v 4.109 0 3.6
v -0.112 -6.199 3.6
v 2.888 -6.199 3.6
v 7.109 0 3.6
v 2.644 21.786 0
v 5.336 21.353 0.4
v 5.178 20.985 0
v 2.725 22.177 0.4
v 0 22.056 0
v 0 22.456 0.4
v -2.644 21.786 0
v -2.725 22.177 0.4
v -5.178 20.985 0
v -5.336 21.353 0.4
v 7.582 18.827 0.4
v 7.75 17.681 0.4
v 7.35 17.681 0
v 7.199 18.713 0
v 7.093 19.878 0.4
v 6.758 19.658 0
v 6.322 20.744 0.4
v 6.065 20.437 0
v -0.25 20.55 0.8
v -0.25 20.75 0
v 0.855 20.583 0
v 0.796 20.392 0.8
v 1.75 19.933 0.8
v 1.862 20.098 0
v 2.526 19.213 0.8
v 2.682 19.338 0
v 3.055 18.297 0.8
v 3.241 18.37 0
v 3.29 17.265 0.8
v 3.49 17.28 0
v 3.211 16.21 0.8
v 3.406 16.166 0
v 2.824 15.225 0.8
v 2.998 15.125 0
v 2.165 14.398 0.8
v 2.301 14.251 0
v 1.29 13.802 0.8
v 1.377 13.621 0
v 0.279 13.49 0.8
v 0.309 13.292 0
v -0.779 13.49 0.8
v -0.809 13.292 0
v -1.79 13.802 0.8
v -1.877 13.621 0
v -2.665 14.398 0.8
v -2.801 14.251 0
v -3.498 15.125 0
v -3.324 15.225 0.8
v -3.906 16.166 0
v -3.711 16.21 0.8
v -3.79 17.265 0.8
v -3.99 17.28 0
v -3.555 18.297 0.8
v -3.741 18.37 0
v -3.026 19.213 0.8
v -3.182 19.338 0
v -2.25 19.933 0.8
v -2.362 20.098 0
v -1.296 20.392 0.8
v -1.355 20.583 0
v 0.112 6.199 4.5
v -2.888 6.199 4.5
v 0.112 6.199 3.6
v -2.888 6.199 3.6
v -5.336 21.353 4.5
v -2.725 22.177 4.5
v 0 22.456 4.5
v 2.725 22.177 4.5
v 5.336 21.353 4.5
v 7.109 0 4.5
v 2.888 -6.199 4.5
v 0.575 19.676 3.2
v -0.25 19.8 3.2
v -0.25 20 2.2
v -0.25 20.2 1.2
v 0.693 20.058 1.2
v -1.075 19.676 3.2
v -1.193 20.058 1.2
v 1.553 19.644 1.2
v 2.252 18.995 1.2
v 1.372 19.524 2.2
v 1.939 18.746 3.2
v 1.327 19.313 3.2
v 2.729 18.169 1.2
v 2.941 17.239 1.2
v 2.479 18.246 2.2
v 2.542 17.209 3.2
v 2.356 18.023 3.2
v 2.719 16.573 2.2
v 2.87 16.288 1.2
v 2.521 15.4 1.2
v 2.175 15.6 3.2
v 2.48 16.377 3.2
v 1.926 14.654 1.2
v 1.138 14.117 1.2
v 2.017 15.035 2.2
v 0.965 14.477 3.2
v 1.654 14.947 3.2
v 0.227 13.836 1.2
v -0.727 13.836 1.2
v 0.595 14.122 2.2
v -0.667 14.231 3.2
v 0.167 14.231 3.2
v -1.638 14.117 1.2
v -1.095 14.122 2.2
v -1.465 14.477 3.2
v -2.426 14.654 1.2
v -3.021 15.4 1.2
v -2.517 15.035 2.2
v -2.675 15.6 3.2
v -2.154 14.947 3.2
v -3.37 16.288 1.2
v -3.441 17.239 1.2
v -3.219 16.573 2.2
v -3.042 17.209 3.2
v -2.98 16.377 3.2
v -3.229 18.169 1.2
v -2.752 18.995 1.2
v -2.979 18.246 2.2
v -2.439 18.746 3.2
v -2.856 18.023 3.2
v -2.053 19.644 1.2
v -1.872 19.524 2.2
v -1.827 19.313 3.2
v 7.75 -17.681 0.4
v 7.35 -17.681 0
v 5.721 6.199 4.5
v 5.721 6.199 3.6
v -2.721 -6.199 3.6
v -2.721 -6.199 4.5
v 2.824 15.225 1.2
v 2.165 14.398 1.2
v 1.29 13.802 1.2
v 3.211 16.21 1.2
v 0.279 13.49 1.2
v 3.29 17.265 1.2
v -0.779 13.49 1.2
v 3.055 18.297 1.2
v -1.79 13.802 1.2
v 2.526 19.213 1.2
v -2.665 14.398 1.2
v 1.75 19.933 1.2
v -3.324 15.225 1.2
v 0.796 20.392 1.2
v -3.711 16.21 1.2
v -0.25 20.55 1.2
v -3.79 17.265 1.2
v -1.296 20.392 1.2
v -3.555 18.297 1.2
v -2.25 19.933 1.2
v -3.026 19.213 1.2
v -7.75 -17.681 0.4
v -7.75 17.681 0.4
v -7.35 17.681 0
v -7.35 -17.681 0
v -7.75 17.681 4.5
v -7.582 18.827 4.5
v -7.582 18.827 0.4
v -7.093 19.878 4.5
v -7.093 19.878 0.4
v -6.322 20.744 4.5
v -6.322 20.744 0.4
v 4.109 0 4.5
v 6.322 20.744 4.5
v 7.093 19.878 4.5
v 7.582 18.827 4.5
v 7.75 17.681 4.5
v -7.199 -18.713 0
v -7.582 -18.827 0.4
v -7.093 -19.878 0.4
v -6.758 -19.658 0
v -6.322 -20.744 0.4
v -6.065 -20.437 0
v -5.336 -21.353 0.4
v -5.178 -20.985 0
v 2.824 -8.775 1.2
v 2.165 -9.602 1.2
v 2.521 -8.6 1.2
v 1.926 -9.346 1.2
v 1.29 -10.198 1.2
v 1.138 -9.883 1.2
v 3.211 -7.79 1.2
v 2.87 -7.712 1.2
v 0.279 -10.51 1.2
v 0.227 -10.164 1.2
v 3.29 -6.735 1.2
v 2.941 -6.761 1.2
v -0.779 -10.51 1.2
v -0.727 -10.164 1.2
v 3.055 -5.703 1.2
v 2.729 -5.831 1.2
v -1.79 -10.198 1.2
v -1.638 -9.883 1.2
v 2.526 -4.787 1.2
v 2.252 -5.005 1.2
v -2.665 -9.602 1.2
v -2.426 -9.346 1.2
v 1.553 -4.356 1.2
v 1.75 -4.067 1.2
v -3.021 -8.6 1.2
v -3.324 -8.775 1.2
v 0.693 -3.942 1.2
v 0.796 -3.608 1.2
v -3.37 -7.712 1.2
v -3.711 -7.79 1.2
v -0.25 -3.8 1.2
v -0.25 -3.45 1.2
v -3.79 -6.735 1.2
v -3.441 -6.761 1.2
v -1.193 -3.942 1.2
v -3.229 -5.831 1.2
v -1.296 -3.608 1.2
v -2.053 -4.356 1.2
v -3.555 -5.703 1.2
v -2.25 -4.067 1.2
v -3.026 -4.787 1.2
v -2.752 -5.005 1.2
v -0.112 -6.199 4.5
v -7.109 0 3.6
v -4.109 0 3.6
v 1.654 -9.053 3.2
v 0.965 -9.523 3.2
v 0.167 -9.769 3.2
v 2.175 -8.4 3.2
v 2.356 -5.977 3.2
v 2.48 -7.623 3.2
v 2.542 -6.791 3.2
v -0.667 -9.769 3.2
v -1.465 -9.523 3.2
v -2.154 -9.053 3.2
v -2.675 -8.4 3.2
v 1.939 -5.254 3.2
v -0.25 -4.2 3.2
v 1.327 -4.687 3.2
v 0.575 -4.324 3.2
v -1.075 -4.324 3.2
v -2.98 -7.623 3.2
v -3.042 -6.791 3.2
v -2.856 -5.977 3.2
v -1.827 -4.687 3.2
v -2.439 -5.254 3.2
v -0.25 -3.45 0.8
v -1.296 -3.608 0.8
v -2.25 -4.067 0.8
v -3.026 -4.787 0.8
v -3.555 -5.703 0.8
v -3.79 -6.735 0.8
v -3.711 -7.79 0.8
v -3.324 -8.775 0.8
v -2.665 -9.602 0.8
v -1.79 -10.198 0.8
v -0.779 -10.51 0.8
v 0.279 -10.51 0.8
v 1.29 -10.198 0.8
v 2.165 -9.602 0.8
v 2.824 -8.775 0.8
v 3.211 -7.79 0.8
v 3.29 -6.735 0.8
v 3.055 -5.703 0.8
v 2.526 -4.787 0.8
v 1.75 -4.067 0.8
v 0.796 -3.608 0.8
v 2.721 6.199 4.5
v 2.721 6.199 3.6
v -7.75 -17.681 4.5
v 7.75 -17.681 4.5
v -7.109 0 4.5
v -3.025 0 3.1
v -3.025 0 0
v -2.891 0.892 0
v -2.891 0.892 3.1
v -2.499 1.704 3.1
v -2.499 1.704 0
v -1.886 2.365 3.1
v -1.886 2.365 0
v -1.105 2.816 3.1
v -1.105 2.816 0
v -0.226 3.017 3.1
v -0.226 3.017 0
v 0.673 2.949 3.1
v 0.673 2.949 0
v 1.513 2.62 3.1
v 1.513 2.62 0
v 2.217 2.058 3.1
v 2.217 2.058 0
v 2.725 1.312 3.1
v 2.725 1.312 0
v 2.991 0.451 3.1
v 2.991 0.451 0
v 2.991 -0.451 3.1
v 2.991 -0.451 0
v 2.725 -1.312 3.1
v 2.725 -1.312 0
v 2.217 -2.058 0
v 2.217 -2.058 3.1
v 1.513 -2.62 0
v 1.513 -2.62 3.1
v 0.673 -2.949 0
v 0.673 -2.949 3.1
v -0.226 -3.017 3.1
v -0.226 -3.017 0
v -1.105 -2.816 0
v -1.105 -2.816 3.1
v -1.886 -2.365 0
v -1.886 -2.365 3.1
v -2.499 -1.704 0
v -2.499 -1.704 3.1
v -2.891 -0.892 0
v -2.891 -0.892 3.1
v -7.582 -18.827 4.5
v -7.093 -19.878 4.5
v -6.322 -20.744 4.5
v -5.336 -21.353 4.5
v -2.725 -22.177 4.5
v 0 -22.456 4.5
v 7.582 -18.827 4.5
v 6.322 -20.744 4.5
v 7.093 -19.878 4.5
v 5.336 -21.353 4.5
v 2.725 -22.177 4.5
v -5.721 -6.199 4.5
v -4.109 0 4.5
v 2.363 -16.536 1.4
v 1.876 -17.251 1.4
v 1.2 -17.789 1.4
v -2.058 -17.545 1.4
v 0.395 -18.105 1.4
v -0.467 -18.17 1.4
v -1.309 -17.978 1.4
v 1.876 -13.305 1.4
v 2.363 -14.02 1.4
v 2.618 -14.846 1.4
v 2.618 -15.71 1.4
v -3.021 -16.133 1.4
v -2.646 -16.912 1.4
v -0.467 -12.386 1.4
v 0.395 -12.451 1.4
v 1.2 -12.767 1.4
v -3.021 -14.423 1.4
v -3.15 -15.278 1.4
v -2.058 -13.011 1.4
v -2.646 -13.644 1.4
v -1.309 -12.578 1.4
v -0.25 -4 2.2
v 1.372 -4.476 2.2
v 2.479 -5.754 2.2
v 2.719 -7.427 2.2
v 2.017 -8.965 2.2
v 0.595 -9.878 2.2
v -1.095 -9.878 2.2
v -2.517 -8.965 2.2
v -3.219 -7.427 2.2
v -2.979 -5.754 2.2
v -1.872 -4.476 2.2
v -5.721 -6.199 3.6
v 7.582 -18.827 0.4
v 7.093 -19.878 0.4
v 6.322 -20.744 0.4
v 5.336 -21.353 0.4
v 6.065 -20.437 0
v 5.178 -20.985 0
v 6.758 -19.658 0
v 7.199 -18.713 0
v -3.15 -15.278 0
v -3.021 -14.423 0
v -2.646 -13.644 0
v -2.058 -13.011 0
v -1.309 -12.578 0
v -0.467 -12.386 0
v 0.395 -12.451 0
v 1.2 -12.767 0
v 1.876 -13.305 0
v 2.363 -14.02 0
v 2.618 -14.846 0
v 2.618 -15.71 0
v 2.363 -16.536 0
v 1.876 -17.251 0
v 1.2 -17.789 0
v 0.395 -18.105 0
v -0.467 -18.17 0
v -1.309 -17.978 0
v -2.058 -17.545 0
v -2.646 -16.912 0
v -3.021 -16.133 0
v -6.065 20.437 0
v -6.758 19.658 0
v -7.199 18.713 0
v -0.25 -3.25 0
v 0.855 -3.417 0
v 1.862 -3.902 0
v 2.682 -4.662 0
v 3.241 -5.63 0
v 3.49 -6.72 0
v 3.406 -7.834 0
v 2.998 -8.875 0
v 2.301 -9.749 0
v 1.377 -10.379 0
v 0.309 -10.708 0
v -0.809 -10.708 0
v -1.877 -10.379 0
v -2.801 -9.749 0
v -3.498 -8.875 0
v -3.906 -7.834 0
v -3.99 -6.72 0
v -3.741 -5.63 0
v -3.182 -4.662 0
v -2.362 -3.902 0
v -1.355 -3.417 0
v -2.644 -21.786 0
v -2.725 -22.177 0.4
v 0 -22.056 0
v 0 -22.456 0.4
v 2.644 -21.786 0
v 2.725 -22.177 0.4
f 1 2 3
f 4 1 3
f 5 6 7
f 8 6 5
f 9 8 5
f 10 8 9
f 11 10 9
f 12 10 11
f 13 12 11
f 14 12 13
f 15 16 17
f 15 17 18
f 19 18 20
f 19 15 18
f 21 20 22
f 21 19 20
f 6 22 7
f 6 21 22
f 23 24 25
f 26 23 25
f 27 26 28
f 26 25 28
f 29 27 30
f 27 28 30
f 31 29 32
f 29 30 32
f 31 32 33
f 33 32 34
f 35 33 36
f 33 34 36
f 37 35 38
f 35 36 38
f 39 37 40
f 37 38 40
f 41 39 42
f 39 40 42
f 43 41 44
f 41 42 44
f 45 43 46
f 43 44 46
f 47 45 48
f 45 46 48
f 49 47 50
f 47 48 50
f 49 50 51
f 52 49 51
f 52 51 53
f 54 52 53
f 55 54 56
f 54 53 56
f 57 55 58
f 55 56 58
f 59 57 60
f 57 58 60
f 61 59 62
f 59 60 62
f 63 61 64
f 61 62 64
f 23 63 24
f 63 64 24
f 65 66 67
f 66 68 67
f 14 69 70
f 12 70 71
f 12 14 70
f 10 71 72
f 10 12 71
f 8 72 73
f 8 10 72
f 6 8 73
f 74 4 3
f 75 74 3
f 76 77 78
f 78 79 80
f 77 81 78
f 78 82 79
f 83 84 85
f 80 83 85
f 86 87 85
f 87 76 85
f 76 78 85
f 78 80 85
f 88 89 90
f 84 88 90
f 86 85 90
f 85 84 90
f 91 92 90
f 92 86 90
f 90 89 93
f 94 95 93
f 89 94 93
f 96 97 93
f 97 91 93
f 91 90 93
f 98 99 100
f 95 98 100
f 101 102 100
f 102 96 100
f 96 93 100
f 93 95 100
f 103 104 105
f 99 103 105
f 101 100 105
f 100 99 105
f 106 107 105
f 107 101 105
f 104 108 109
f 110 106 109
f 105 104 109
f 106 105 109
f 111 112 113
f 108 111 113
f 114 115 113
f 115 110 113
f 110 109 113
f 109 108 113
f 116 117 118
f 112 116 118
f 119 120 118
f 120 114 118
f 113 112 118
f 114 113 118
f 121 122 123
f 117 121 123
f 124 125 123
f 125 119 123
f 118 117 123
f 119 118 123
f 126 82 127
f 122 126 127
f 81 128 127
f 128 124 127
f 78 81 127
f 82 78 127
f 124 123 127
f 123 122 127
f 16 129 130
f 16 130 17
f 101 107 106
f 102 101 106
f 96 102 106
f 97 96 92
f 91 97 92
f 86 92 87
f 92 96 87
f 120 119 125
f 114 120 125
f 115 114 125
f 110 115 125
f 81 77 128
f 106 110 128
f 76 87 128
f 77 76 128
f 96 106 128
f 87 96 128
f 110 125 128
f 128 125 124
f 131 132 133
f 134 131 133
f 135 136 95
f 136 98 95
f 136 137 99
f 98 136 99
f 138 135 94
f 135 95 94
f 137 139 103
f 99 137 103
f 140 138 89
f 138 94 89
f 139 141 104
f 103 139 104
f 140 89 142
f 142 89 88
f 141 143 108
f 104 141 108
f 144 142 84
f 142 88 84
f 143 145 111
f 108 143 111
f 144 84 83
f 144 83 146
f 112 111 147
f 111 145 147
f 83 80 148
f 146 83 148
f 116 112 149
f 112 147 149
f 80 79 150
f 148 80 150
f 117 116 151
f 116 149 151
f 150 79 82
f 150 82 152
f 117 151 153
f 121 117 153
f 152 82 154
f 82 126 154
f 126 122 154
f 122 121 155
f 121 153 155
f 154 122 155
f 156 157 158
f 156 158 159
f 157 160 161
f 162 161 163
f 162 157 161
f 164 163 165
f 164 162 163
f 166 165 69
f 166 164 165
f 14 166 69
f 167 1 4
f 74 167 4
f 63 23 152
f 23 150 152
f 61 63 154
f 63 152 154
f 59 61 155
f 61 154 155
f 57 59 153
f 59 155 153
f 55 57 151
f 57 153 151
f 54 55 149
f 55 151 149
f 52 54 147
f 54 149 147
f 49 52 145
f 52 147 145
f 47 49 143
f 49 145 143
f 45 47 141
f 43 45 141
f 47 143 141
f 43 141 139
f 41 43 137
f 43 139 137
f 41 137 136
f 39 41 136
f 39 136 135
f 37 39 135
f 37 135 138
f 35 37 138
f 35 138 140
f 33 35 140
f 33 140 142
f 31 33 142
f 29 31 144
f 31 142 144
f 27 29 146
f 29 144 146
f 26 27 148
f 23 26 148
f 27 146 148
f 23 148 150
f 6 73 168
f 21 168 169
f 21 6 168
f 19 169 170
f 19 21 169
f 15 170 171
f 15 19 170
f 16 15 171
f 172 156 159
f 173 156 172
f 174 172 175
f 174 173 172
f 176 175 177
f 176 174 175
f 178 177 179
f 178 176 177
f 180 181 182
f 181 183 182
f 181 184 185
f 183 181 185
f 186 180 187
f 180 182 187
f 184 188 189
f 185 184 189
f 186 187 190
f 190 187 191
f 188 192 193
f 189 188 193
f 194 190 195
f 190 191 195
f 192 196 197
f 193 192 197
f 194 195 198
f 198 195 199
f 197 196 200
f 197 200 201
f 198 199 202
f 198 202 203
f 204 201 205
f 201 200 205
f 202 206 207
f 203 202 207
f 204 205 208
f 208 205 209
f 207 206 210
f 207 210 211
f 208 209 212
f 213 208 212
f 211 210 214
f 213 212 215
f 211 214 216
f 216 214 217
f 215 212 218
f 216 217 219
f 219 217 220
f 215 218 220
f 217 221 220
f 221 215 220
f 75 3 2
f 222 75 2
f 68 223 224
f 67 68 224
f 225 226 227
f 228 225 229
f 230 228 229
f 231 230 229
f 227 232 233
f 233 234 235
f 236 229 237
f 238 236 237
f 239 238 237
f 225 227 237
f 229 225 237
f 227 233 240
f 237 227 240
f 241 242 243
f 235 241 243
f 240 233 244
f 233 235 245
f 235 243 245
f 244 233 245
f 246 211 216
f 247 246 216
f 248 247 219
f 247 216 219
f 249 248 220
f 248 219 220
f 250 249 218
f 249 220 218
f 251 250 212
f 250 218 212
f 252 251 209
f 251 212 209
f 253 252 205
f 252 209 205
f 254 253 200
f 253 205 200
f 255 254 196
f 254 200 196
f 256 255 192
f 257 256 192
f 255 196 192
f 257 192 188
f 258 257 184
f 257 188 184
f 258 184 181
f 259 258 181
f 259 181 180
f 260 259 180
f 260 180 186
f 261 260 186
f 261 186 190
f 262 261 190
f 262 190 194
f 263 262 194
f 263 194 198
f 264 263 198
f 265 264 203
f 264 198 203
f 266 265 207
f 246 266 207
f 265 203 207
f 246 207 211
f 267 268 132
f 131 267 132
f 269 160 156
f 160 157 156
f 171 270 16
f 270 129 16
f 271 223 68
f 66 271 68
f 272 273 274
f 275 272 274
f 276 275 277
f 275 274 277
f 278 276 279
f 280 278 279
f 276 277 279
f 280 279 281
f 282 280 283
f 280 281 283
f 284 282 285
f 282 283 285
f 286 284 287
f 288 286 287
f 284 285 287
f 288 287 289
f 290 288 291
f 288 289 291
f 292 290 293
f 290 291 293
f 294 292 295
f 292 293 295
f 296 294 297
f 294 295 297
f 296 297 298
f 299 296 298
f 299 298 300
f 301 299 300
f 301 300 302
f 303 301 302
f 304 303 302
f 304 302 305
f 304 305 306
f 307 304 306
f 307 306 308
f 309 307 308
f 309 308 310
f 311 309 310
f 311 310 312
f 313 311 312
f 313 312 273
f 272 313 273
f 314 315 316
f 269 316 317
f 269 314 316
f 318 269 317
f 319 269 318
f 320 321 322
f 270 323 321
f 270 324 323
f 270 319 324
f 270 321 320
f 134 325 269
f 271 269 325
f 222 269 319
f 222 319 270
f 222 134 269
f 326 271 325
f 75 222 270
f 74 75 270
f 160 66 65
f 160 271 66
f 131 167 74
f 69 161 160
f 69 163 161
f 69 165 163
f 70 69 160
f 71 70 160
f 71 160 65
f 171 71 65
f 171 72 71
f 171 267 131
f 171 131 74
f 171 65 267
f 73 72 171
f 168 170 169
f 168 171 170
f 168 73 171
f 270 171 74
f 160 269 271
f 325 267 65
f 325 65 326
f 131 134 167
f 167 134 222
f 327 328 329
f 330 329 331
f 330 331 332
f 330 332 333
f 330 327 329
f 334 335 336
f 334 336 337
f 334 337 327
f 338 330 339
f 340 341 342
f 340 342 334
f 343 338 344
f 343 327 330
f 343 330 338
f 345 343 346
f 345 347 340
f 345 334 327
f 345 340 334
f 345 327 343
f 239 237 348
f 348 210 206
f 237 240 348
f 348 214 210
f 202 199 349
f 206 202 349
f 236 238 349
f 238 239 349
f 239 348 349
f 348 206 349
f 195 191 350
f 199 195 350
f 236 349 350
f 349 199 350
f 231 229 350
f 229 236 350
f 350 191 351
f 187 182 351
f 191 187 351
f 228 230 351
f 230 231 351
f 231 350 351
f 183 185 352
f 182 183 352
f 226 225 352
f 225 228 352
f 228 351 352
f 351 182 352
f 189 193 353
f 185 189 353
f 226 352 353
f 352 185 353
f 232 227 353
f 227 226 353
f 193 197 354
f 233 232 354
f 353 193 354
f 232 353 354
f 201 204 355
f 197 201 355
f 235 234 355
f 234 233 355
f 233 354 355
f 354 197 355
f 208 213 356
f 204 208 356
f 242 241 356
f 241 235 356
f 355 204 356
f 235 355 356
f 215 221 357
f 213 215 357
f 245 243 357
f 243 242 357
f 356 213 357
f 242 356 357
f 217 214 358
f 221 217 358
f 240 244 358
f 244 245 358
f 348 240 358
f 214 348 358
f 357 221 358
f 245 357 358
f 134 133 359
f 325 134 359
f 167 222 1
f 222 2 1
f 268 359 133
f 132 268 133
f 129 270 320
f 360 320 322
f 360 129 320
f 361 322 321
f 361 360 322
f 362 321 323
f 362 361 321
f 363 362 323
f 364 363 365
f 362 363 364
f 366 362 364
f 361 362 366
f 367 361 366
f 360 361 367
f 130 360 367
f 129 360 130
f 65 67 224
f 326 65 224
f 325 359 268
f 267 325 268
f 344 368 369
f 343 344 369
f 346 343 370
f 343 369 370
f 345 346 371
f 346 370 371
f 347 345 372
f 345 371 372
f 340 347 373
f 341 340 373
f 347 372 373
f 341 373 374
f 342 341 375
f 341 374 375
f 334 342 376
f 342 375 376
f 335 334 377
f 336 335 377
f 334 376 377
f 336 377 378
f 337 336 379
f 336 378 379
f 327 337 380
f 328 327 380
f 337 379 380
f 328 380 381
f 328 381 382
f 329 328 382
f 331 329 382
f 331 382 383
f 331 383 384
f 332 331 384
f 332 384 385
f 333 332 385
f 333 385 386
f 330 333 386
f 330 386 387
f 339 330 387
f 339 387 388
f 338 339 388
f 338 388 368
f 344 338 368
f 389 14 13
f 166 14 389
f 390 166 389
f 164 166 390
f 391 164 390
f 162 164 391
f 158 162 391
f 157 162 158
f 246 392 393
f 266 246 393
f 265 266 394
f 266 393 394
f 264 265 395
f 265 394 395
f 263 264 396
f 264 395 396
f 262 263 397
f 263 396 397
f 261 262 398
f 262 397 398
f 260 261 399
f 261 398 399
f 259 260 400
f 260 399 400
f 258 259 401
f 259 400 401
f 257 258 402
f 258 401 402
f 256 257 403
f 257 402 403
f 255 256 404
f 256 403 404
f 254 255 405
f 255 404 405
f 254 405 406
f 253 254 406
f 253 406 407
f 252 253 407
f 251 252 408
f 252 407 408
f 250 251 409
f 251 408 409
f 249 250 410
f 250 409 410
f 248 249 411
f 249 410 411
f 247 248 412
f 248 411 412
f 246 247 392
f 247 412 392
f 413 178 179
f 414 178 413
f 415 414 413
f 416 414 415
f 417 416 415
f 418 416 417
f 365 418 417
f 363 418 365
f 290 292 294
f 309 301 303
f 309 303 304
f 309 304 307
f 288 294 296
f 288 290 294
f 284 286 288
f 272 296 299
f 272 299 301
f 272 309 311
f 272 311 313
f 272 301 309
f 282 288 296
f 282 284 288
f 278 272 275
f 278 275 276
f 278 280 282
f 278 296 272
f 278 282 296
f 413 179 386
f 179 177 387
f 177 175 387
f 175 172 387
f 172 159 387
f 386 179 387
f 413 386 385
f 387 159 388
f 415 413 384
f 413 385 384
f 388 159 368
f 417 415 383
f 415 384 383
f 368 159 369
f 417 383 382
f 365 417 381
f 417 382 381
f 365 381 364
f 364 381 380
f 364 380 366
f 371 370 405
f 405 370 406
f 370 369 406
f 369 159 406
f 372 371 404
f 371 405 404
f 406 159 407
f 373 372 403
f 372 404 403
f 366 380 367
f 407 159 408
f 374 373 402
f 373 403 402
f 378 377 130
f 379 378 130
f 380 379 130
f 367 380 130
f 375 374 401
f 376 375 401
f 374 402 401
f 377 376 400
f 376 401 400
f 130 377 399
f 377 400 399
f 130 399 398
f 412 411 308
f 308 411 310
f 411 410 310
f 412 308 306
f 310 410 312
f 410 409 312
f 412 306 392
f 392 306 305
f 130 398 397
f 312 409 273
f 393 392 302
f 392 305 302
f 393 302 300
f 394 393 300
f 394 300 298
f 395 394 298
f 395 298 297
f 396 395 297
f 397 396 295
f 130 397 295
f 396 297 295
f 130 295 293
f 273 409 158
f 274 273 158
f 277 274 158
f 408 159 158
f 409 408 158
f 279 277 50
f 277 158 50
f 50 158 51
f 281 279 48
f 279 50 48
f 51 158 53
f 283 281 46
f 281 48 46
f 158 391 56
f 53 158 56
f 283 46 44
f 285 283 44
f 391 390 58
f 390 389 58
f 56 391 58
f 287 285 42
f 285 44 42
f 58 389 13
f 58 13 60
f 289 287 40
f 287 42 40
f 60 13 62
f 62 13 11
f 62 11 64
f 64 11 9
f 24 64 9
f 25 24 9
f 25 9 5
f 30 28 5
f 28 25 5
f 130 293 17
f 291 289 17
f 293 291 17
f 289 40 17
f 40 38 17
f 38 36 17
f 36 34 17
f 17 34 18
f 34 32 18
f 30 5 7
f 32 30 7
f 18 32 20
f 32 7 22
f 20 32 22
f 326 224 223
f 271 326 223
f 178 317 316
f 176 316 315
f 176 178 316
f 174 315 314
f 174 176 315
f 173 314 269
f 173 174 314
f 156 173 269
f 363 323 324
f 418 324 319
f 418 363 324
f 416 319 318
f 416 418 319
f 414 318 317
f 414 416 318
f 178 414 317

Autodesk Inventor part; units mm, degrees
ref_plane "YZ Plane" through (0, 0, 0) normal (1, 0, 0) x (0, 1, 0)
ref_plane "XZ Plane" through (0, 0, 0) normal (0, 1, 0) x (-1, 0, 0)
ref_plane "XY Plane" through (0, 0, 0) normal (0, 0, 1) x (1, 0, 0)
sketch "Skizze1" plane through (0, 0, 0) normal (0, 0, 1) x (1, 0, 0)
  line L0 (7.75, -17.6806) -> (7.75, 17.6806) projected
  line L1 (-7.75, 17.6806) -> (-7.75, -17.6806) projected
  circle A0 centre (0, 0) radius 3.025 projected
  arc A1 (-5.3363, -21.3526) -> (5.3363, -21.3526) centre (0, -9) ccw projected
  arc A2 (5.3363, -21.3526) -> (7.75, -17.6806) centre (3.75, -17.6806) ccw projected
  arc A3 (7.75, 17.6806) -> (5.3363, 21.3526) centre (3.75, 17.6806) ccw projected
  arc A4 (5.3363, 21.3526) -> (-5.3363, 21.3526) centre (0, 9) ccw projected
  arc A5 (-5.3363, 21.3526) -> (-7.75, 17.6806) centre (-3.75, 17.6806) ccw projected
  arc A6 (-7.75, -17.6806) -> (-5.3363, -21.3526) centre (-3.75, -17.6806) ccw projected
  circle A7 centre (-0.25, 17) radius 1.7 projected
  circle A8 centre (-0.25, -7) radius 1.7 projected
  line L2 (5.34, 14.1) -> (3.3, 14.1) projected
  line L3 (3.3, 14.1) -> (3.3, 17.74) projected
  line L4 (3.3, 17.74) -> (5.34, 17.74) projected
  line L5 (5.34, 17.74) -> (5.34, 14.1) projected
  line L6 (-3.8, 14.1) -> (-5.84, 14.1) projected
  line L7 (-5.84, 14.1) -> (-5.84, 17.74) projected
  line L8 (-5.84, 17.74) -> (-3.8, 17.74) projected
  line L9 (-3.8, 17.74) -> (-3.8, 14.1) projected
  circle A9 centre (-0.25, -15.278) radius 2.9 projected
  point P0 (0, 0)
  point P1 (-17.1225, -5.975)
  point P2 (-17.1225, -12.025)
  point P3 (-17.1225, 6.3)
  point P4 (-17.1225, -14.3)
  point P5 (-17.1225, -17.7)
extrude "Extrusion1" add sketch "Skizze1" along normal blind 4 contours A2 A1 A6 L1 A5 A4 A3 L0 | A0 | A7 | A8 | L2 L3 L4 L5 | L6 L7 L8 L9 | A9
sketch "Skizze2" plane through (0, 0, 0) normal (0, 0, -1) x (-1, 0, 0)
  circle A0 centre (0, 0) radius 3.025 projected
  arc A1 (-5.3363, -21.3526) -> (5.3363, -21.3526) centre (0, -9) ccw projected
  arc A2 (-7.75, -17.6806) -> (-5.3363, -21.3526) centre (-3.75, -17.6806) ccw projected
  line L0 (-7.75, -17.6806) -> (-7.75, 17.6806) projected
  arc A3 (-5.3363, 21.3526) -> (-7.75, 17.6806) centre (-3.75, 17.6806) ccw projected
  arc A4 (5.3363, 21.3526) -> (-5.3363, 21.3526) centre (0, 9) ccw projected
  arc A5 (7.75, 17.6806) -> (5.3363, 21.3526) centre (3.75, 17.6806) ccw projected
  line L1 (7.75, 17.6806) -> (7.75, -17.6806) projected
  arc A6 (5.3363, -21.3526) -> (7.75, -17.6806) centre (3.75, -17.6806) ccw projected
  circle A7 centre (0.25, 17) radius 1.7 projected
  circle A8 centre (0.25, -7) radius 1.7 projected
  line L2 (-5.34, 14.1) -> (-3.3, 14.1) projected
  line L3 (-3.3, 14.1) -> (-3.3, 17.74) projected
  line L4 (-3.3, 17.74) -> (-5.34, 17.74) projected
  line L5 (-5.34, 17.74) -> (-5.34, 14.1) projected
  line L6 (3.8, 14.1) -> (5.84, 14.1) projected
  line L7 (5.84, 14.1) -> (5.84, 17.74) projected
  line L8 (5.84, 17.74) -> (3.8, 17.74) projected
  line L9 (3.8, 17.74) -> (3.8, 14.1) projected
  circle A9 centre (0.25, -15.278) radius 2.9 projected
  point P0 (0, 0)
extrude "Extrusion2" cut sketch "Skizze2" against normal blind 3.1 contours A0
sketch "Skizze3" plane through (0, 0, 0) normal (0, 0, -1) x (-1, 0, 0)
  circle A0 centre (0, 0) radius 3.025 projected
  arc A1 (-5.3363, -21.3526) -> (5.3363, -21.3526) centre (0, -9) ccw projected
  arc A2 (-7.75, -17.6806) -> (-5.3363, -21.3526) centre (-3.75, -17.6806) ccw projected
  line L0 (-7.75, -17.6806) -> (-7.75, 17.6806) projected
  arc A3 (-5.3363, 21.3526) -> (-7.75, 17.6806) centre (-3.75, 17.6806) ccw projected
  arc A4 (5.3363, 21.3526) -> (-5.3363, 21.3526) centre (0, 9) ccw projected
  arc A5 (7.75, 17.6806) -> (5.3363, 21.3526) centre (3.75, 17.6806) ccw projected
  line L1 (7.75, 17.6806) -> (7.75, -17.6806) projected
  arc A6 (5.3363, -21.3526) -> (7.75, -17.6806) centre (3.75, -17.6806) ccw projected
  circle A7 centre (0.25, 17) radius 1.7 projected
  circle A8 centre (0.25, -7) radius 1.7 projected
  line L2 (-5.34, 14.1) -> (-3.3, 14.1) projected
  line L3 (-3.3, 14.1) -> (-3.3, 17.74) projected
  line L4 (-3.3, 17.74) -> (-5.34, 17.74) projected
  line L5 (-5.34, 17.74) -> (-5.34, 14.1) projected
  line L6 (3.8, 14.1) -> (5.84, 14.1) projected
  line L7 (5.84, 14.1) -> (5.84, 17.74) projected
  line L8 (5.84, 17.74) -> (3.8, 17.74) projected
  line L9 (3.8, 17.74) -> (3.8, 14.1) projected
  circle A9 centre (0.25, -15.278) radius 2.9 projected
  point P0 (0, 0)
hole "Bohrung1" at (-0.25, 17, 0) at (-0.25, -7, 0) direction (0, 0, 1) diameter 5.6 depth 3.2 counterbore diameter 7.1 counterbore depth 1.2
sketch "Skizze4" plane through (0, 0, 4) normal (0, 0, 1) x (1, 0, 0)
  circle A0 centre (-0.25, 17) radius 3.55 projected
  circle A1 centre (-0.25, -7) radius 3.55 projected
  circle A2 centre (0, 0) radius 3.025 projected
  arc A3 (5.3363, -21.3526) -> (7.75, -17.6806) centre (3.75, -17.6806) ccw projected
  arc A4 (-5.3363, -21.3526) -> (5.3363, -21.3526) centre (0, -9) ccw projected
  arc A5 (-7.75, -17.6806) -> (-5.3363, -21.3526) centre (-3.75, -17.6806) ccw projected
  line L0 (-7.75, 17.6806) -> (-7.75, -17.6806) projected
  arc A6 (-5.3363, 21.3526) -> (-7.75, 17.6806) centre (-3.75, 17.6806) ccw projected
  arc A7 (5.3363, 21.3526) -> (-5.3363, 21.3526) centre (0, 9) ccw projected
  arc A8 (7.75, 17.6806) -> (5.3363, 21.3526) centre (3.75, 17.6806) ccw projected
  line L1 (7.75, -17.6806) -> (7.75, 17.6806) projected
  circle A9 centre (12.6079, -10) radius 2.8
  circle A10 centre (12.6079, -10) radius 2.8
  line L2 (4.1087, 0) -> (7.1087, 0)
  line L3 (7.1087, 0) -> (2.8877, -6.1994)
  line L4 (2.8877, -6.1994) -> (-0.1123, -6.1994)
  line L5 (-0.1123, -6.1994) -> (4.1087, 0)
  line L6 (2.721, 6.1994) -> (5.721, 6.1994)
  line L7 (5.721, 6.1994) -> (-2.721, -6.1994)
  line L8 (-2.721, -6.1994) -> (-5.721, -6.1994)
  line L9 (-5.721, -6.1994) -> (2.721, 6.1994)
  line L10 (-2.8877, 6.1994) -> (0.1123, 6.1994)
  line L11 (0.1123, 6.1994) -> (-4.1087, 0)
  line L12 (-4.1087, 0) -> (-7.1087, 0)
  line L13 (-7.1087, 0) -> (-2.8877, 6.1994)
  line L14 (7.1087, 6.1994) -> (7.1087, -6.1994)
  line L15 (7.1087, -6.1994) -> (-7.1087, -6.1994)
  line L16 (-7.1087, -6.1994) -> (-7.1087, 6.1994)
  line L17 (-7.1087, 6.1994) -> (7.1087, 6.1994)
  point P0 (0, 0)
  point P1 (16.5579, -10)
  point P2 (16.5579, -10)
  point P3 (16.5579, -10)
  point P4 (50.5428, -9.282)
  point P5 (-4.221, -6.1994)
  point P6 (4.221, 6.1994)
  point P7 (-1.3877, 6.1994)
  point P8 (1.3877, -6.1994)
  dimension "d89" = 5.6
  dimension "d104" = 5.6
  dimension "d107" = 14.2174
  dimension "d108" = 12.3988
  dimension "d109" = 2.1563
  dimension "d110" = 2.1563
  dimension "d111" = 2.4798
  dimension "d112" = 2.4798
  dimension "d113" = 2.4798
  dimension "d114" = 6.1994
  dimension "d115" = 6.1994
  dimension "d116" = 6.1994
  dimension "d117" = 15.5
  dimension "d118" = 0.6413
move faces "Verschieben1" translate (0, 0, 0.5) faces at (-2.5833, -5.8935, 4)
extrude "Extrusion4" cut sketch "Skizze4" along normal mid plane 0.8 contours L8 L9 A2 L7 A1 | A1 L7 L8 | L3 L4 L5 A1 | A1 L5 L2 L3 | A2 L9 L7 | A2 L9 L6 L7 | L13 L10 L11 L12
extrude "Extrusion5" cut sketch "Skizze4" along normal through all contours L8 L9 A2 L7 A1 | A1 L7 L8 | L3 L4 L5 A1 | A1 L5 L2 L3 | A2 L9 L7 | A2 L9 L6 L7 | L13 L10 L11 L12
sketch "Skizze5" plane through (0, 0, 0) normal (0, 0, -1) x (-1, 0, 0)
  circle A0 centre (0.25, -15.278) radius 2.9 projected
  point P0 (0, 0)
extrude "Extrusion6" cut sketch "Skizze5" against normal blind 1.4
chamfer "Fase2" distance 0.2 distance2 0.8 1 edges at (-0.25, -10.55, 0) measured on face at (6.175, 0, 0)
chamfer "Fase3" distance 2 distance2 0.4 1 edges at (-0.25, -9.8, 1.2) measured on face at (0.1992, -4.2363, 2.5333)
chamfer "Fase4" distance 2 distance2 0.4 1 edges at (-0.25, 14.2, 1.2) measured on face at (0.1992, 19.7637, 2.5333)
chamfer "Fase5" distance 0.2 distance2 0.8 1 edges at (-0.25, 13.45, 0) measured on face at (6.175, 0, 0)
chamfer "Fase6" distance 0.4 angle 45 8 edges at (-7.75, 0, 0) (-7.0925, -19.8777, 0) (0, -22.4559, 0) (7.0925, -19.8777, 0) (7.75, 0, 0) (7.0925, 19.8777, 0) (0, 22.4559, 0) (-7.0925, 19.8777, 0)
properties part number "Cover_Squared"
